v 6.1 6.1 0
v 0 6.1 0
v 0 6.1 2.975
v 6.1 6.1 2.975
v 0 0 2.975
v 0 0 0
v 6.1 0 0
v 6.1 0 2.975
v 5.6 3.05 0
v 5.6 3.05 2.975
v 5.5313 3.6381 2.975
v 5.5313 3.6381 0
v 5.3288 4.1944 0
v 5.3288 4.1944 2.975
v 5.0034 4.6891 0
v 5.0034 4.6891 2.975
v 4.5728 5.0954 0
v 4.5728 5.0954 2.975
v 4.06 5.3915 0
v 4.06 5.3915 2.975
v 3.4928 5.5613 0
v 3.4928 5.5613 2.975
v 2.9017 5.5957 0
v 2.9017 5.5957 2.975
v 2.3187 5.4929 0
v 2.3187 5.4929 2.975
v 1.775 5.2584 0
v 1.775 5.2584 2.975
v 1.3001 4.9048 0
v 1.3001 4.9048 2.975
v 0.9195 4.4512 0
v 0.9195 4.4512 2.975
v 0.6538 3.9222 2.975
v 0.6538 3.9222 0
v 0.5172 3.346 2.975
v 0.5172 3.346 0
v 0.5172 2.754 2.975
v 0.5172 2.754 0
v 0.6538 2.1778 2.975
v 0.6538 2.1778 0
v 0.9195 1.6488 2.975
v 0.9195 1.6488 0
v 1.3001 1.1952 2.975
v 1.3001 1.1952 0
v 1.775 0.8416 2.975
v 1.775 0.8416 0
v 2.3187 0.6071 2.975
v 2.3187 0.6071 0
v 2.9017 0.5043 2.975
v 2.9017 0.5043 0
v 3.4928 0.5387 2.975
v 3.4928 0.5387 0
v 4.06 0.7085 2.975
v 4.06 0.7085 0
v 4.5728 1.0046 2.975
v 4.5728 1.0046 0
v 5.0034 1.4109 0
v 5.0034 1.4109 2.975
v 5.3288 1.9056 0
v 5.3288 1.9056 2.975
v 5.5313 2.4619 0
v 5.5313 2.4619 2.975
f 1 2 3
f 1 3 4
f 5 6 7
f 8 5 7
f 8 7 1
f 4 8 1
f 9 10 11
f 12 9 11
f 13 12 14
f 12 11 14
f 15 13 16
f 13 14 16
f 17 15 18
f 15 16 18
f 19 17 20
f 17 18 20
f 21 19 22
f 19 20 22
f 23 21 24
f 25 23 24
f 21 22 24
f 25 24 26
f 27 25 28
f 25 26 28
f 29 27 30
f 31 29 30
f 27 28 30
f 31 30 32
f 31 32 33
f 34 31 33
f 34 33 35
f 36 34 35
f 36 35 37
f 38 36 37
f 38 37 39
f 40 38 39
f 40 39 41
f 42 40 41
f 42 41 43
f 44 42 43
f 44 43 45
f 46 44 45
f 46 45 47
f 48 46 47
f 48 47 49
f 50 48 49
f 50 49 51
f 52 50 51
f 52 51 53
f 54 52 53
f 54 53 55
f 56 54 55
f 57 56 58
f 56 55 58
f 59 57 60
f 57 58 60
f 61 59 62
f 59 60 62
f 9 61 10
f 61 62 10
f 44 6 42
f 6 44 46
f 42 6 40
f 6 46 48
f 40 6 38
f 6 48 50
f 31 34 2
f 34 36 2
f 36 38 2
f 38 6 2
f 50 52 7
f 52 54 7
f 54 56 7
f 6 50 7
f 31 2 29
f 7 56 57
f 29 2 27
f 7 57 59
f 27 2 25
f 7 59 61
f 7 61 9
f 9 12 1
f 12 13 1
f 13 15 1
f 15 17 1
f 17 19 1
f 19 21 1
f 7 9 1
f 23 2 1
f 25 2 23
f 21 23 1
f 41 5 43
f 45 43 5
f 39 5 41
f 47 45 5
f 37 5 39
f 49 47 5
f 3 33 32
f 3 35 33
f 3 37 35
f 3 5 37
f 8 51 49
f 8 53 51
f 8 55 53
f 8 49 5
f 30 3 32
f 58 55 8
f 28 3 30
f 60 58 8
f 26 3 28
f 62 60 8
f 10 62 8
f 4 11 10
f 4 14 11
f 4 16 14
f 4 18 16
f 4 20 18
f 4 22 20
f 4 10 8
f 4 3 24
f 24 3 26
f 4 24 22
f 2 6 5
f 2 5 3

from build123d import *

# Parameters (mm, degrees)
SKETCH1_W           = 6.1
SKETCH1_H           = 6.1
BOSS_EXTRUDE1_DEPTH = 2.975
CUT_EXTRUDE1_REACH  = 11.125
SKETCH2_R           = 2.55


with BuildPart() as part:
    # Sketch1 → Boss-Extrude1 (new body)
    with BuildSketch(Plane.XY):
        with Locations((3.05, 3.05)):
            Rectangle(SKETCH1_W, SKETCH1_H)
    extrude(amount=BOSS_EXTRUDE1_DEPTH)

    # Sketch2 → Cut-Extrude1 (cut, up to next)
    with BuildSketch(Plane.XY.offset(2.975), mode=Mode.PRIVATE) as cut_extrude1_sk1:
        with Locations((3.05, 3.05)):
            Circle(SKETCH2_R)
    cut_extrude1_tool1 = extrude(cut_extrude1_sk1.sketch, amount=-CUT_EXTRUDE1_REACH, mode=Mode.PRIVATE) & part.part
    add(cut_extrude1_tool1.solids().sort_by_distance((3.05, 3.05, 2.975))[0], mode=Mode.SUBTRACT)


solid = part.part
